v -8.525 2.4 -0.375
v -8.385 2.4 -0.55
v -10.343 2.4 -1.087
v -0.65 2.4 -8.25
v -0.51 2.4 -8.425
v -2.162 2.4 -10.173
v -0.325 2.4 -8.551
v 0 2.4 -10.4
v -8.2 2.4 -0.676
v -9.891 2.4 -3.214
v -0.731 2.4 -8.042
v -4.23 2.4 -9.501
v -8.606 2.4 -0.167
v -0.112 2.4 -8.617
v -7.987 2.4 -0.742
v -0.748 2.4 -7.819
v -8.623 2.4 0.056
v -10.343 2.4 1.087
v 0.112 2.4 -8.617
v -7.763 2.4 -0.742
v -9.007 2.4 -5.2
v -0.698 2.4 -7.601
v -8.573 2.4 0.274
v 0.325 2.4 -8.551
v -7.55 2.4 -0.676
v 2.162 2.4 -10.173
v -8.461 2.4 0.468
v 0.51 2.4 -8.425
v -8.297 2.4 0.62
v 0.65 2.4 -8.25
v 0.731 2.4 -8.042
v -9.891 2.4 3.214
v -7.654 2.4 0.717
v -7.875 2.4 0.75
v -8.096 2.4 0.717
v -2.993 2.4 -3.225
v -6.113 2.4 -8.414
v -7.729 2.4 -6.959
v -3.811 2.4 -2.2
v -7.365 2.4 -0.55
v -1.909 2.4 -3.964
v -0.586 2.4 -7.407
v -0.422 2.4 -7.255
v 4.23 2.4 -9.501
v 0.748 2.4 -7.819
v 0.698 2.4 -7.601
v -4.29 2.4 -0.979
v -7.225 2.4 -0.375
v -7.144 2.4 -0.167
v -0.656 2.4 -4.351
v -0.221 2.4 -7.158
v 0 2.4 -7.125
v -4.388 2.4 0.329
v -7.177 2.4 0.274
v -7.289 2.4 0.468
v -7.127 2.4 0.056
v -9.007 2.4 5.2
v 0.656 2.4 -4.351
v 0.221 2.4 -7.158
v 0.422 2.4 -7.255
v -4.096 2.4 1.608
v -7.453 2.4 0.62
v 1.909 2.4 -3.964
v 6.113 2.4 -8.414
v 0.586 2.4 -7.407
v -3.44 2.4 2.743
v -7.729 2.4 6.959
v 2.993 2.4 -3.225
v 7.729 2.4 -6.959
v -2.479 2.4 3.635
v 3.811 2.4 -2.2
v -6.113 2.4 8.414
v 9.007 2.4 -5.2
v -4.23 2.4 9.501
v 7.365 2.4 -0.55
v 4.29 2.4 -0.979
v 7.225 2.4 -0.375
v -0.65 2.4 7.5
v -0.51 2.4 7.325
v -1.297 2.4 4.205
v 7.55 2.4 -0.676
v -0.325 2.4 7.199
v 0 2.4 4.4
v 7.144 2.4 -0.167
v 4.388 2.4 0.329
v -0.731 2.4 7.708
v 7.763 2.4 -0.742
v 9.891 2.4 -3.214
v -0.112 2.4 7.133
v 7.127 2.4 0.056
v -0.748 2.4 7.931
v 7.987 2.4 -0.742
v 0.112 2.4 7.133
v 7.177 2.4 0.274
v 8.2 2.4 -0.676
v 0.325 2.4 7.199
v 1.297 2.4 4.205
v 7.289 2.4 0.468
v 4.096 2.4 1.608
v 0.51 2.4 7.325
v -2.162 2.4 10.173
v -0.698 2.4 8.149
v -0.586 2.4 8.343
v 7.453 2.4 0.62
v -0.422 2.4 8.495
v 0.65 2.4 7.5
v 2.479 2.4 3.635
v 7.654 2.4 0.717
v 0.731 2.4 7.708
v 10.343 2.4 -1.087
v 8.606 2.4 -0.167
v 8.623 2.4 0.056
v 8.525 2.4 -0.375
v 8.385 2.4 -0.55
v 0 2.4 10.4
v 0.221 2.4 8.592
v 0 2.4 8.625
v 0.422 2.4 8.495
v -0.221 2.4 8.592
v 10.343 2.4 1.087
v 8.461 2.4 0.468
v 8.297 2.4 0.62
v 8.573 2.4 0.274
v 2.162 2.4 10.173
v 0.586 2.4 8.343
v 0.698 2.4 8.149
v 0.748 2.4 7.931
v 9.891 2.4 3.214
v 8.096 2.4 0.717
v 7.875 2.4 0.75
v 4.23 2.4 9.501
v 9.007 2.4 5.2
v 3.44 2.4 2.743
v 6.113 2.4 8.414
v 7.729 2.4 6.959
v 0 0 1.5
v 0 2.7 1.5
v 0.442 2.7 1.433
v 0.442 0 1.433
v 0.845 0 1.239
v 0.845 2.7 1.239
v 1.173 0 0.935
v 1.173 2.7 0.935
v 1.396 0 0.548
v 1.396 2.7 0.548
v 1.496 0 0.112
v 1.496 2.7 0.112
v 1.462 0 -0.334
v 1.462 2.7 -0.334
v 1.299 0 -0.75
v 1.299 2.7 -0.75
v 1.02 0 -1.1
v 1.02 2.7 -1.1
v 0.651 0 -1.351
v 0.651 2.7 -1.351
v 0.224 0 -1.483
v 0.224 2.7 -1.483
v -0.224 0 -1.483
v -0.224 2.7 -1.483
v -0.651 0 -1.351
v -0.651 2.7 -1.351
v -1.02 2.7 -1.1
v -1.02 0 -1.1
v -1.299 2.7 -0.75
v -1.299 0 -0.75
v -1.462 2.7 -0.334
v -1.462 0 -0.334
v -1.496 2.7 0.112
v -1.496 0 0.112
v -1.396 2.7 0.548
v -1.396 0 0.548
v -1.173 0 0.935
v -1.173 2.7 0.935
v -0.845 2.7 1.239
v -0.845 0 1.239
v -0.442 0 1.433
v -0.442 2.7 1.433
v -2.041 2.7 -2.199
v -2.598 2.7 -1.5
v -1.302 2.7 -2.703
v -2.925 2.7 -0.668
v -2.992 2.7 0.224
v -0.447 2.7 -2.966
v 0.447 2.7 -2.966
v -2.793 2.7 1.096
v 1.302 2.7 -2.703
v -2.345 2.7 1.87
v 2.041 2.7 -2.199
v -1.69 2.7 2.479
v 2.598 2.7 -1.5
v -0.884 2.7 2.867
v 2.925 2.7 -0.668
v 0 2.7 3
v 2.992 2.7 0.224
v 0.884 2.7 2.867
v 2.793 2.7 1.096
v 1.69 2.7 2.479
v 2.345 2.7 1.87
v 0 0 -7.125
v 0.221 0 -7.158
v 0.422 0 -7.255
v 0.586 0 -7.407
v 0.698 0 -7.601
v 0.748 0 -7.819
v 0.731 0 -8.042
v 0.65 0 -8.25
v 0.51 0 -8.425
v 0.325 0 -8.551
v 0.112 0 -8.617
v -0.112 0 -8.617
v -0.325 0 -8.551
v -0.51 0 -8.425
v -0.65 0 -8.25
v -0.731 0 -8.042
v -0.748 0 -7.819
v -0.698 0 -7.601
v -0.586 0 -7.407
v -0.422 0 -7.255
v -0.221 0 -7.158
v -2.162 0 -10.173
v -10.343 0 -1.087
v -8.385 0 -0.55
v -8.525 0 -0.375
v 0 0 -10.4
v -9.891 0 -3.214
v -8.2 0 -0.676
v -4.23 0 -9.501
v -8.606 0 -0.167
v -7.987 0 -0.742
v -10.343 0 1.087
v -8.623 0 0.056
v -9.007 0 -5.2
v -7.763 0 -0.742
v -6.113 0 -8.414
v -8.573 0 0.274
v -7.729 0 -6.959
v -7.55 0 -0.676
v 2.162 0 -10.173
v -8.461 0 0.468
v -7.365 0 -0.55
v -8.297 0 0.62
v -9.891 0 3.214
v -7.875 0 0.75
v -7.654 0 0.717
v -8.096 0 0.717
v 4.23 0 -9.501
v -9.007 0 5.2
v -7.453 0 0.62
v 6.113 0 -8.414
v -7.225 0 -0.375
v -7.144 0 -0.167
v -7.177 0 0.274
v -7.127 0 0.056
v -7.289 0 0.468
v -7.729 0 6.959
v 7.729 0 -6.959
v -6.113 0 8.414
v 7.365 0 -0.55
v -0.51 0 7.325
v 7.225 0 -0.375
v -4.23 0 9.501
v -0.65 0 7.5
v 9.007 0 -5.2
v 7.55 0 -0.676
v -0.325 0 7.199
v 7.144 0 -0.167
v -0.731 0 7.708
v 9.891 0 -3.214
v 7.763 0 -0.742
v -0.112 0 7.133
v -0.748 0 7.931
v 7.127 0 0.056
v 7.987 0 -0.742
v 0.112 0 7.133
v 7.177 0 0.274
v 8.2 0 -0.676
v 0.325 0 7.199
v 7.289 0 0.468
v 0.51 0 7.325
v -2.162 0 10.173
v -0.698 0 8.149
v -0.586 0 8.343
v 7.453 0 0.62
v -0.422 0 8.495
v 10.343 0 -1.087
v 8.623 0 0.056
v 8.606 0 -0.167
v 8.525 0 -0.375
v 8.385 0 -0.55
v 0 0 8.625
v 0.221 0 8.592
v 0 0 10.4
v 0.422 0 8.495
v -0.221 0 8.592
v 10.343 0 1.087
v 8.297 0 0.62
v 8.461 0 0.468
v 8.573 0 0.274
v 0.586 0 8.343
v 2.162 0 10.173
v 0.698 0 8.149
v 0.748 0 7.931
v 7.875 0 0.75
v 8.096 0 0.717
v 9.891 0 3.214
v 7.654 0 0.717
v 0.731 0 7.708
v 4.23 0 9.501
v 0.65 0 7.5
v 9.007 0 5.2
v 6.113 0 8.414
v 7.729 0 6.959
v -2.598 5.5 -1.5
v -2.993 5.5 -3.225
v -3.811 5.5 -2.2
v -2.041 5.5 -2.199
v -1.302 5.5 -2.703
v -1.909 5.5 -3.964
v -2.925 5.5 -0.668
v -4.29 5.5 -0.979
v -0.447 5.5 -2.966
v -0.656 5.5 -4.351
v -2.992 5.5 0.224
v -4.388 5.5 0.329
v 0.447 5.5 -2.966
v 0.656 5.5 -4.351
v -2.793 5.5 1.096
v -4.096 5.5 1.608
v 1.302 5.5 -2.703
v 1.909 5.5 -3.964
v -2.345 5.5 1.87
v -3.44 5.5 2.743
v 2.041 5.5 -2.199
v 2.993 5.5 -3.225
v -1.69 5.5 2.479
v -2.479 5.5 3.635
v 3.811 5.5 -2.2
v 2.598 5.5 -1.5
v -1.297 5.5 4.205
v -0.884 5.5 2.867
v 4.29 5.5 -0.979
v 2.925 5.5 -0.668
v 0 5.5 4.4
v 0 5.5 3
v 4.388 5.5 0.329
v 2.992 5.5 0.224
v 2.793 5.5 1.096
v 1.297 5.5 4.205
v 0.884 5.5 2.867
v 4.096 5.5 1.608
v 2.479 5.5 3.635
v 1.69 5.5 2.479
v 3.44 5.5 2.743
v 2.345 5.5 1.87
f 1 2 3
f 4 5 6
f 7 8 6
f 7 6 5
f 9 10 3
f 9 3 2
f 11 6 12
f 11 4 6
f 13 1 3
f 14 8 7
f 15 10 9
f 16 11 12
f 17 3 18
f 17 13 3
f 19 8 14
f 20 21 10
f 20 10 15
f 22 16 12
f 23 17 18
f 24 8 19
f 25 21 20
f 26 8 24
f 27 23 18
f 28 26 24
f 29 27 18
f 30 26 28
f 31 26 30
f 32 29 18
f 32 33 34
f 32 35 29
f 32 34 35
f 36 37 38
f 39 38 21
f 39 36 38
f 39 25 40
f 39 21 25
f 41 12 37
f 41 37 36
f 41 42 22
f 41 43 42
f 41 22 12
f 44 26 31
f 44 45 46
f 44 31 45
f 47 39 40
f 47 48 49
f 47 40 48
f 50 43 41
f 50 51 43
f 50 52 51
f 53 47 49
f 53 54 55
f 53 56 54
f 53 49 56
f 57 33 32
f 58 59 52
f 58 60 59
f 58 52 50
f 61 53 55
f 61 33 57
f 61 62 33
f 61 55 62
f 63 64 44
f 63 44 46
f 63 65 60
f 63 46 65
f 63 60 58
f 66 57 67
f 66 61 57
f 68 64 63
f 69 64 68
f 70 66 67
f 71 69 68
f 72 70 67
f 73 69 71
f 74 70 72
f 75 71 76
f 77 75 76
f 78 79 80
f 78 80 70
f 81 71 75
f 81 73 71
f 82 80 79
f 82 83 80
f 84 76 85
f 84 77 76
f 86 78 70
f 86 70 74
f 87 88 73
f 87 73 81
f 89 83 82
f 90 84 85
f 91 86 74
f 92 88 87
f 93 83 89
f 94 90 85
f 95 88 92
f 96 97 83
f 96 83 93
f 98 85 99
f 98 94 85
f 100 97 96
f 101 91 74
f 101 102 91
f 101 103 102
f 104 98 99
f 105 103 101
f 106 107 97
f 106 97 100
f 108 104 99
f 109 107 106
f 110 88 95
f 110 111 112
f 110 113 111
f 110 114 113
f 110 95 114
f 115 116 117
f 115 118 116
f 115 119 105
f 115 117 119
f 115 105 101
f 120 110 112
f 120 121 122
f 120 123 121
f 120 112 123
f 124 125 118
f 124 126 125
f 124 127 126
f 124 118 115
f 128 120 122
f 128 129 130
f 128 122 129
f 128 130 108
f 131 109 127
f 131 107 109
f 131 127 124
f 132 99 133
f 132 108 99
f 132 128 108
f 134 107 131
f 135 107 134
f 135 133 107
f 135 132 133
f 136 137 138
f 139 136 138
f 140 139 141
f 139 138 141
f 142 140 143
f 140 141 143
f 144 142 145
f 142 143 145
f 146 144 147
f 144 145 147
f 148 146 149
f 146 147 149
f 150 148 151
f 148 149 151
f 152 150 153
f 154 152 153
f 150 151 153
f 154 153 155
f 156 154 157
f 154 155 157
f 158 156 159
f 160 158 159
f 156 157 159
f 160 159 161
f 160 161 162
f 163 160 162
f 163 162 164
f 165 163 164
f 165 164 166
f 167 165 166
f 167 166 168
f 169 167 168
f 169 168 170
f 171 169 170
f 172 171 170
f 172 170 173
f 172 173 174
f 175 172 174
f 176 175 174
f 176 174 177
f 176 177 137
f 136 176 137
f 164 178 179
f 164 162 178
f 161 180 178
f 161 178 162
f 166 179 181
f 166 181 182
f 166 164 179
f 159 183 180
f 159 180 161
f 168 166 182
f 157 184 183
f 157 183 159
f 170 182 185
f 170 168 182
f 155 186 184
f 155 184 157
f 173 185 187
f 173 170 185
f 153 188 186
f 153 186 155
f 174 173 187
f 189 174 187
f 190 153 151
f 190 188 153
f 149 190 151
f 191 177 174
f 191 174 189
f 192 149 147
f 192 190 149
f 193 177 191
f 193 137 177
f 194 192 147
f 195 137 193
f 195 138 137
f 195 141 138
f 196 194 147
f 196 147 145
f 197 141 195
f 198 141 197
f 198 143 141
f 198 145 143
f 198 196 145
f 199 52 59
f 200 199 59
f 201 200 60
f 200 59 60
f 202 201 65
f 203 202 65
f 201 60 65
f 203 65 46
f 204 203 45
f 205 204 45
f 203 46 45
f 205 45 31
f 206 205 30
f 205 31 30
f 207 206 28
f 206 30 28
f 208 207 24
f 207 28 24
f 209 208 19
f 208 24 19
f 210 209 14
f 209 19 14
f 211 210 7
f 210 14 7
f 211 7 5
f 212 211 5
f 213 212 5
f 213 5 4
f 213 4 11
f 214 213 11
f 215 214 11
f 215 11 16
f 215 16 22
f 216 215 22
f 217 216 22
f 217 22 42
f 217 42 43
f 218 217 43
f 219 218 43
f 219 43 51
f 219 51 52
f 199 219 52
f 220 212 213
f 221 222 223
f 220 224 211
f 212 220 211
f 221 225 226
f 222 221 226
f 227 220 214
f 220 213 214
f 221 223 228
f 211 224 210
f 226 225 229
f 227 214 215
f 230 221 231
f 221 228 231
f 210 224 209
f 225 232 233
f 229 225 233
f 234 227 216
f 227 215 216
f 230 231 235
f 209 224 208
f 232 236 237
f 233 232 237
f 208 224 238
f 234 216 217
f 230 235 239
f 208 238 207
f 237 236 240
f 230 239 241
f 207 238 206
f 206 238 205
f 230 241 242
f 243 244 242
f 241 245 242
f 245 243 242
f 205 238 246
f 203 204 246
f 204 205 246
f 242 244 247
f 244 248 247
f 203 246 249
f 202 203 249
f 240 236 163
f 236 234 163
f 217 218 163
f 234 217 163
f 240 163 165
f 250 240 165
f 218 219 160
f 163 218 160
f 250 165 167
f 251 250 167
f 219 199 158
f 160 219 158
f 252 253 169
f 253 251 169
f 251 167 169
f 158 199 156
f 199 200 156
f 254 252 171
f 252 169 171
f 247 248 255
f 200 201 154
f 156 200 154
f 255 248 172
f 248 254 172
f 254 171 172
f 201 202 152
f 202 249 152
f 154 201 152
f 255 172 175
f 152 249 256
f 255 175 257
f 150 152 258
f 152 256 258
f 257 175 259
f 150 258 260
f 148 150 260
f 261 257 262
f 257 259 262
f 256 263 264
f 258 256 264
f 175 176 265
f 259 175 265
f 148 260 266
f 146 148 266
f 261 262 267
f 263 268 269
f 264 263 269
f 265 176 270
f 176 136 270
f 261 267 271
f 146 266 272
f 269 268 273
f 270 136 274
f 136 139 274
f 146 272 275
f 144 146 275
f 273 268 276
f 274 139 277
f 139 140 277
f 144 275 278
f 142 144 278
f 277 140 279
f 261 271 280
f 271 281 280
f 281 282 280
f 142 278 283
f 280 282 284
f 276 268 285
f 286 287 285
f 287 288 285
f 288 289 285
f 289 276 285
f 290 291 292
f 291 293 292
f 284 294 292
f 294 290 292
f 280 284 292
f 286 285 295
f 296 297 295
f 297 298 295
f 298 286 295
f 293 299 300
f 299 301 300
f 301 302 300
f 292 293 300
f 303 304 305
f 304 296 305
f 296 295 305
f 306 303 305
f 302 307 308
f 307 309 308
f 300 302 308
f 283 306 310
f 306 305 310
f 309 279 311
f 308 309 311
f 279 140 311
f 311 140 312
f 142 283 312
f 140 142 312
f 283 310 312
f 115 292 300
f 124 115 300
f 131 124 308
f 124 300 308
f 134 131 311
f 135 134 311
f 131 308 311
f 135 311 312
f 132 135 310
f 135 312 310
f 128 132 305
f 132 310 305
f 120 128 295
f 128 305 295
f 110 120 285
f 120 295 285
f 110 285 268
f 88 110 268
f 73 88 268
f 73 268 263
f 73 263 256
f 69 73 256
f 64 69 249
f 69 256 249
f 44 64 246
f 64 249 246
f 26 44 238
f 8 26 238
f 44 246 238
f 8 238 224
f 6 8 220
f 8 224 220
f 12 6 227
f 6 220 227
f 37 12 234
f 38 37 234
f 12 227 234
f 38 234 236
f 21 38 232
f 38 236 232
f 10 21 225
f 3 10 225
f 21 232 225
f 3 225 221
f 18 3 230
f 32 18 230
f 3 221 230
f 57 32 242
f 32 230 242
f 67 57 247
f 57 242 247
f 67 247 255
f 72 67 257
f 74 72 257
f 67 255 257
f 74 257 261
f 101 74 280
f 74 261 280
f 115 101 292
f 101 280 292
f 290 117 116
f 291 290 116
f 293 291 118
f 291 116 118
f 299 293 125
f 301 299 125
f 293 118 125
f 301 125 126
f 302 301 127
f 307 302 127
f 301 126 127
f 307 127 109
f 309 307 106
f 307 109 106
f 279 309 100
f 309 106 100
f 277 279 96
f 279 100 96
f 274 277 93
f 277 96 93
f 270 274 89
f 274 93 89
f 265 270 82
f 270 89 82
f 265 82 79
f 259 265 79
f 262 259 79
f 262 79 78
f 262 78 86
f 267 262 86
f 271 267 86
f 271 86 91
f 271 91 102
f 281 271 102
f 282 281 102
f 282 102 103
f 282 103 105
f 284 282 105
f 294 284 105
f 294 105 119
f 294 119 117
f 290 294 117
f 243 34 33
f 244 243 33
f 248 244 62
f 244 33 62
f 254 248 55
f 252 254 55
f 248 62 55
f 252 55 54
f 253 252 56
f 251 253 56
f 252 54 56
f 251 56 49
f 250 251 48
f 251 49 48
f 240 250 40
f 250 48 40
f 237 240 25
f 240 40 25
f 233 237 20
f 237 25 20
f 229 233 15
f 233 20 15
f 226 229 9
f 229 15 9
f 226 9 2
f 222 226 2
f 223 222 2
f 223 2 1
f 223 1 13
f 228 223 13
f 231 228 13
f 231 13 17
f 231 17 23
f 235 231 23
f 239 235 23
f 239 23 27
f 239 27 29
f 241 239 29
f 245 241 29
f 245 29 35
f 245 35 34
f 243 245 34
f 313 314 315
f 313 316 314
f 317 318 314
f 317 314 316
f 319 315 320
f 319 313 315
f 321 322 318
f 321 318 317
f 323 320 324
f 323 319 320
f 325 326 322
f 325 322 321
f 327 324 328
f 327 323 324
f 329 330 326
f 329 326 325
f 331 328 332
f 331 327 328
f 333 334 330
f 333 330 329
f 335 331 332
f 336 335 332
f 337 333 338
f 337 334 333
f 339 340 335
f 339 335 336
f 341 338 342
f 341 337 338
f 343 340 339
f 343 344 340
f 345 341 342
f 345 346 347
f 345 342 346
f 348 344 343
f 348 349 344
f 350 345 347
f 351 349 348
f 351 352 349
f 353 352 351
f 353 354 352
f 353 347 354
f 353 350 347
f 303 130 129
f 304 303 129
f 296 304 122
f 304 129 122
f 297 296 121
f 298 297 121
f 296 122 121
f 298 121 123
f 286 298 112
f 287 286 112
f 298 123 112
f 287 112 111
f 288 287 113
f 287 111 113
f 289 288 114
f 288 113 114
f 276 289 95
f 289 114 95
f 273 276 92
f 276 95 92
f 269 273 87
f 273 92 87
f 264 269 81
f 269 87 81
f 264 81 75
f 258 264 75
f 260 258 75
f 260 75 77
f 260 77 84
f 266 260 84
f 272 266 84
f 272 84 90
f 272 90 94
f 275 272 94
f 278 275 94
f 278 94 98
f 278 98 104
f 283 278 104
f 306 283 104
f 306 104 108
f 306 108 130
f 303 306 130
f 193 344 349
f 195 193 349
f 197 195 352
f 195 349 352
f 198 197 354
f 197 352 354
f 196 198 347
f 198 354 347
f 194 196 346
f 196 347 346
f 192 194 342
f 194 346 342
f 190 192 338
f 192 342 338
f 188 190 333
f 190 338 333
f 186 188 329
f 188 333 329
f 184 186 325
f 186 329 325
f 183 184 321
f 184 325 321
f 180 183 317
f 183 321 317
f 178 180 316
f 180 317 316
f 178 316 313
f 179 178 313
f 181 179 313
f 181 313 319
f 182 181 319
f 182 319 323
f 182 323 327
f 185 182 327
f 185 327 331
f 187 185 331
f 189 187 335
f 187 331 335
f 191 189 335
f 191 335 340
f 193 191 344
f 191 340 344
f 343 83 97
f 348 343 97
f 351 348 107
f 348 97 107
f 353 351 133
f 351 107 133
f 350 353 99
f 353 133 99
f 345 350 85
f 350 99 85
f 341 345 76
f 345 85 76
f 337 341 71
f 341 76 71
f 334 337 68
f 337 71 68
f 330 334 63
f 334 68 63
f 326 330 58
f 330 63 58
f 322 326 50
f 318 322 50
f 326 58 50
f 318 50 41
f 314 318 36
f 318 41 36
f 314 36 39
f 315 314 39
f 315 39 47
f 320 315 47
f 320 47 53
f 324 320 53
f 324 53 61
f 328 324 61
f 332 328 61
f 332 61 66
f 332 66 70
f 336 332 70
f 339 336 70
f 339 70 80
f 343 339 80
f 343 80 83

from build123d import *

# Parameters (mm, degrees)
CROQUIS1_R              = 10.4
SALIENTE_EXTRUIR1_DEPTH = 2.4
SALIENTE_EXTRUIR2_START = -2.4
CROQUIS2_R              = 4.4
SALIENTE_EXTRUIR2_DEPTH = 5.5
CROQUIS3_R              = 3
CORTAR_EXTRUIR1_DEPTH   = 2.8
CROQUIS4_R              = 0.75
CORTAR_EXTRUIR2_DEPTH   = 16.030968033
CROQUIS5_R              = 1.5
CORTAR_EXTRUIR3_DEPTH   = 15.971973818


with BuildPart() as part:
    # Croquis1 → Saliente-Extruir1 (new body)
    with BuildSketch(Plane(origin=(0, 0, 0), x_dir=(1, 0, 0), z_dir=(0, 1, 0))):
        with Locations(Location((0, 0, 0), (0, 0, 270))):
            Circle(CROQUIS1_R)
    extrude(amount=SALIENTE_EXTRUIR1_DEPTH)

    # Croquis2 → Saliente-Extruir2 (add)
    with BuildSketch(Plane(origin=(0, 2.4, 0), x_dir=(1, 0, 0), z_dir=(0, 1, 0)).offset(SALIENTE_EXTRUIR2_START)):
        with Locations(Location((0, 0, 0), (0, 0, 270))):
            Circle(CROQUIS2_R)
    extrude(amount=SALIENTE_EXTRUIR2_DEPTH)

    # Croquis3 → Cortar-Extruir1 (cut)
    with BuildSketch(Plane(origin=(0, 5.5, 0), x_dir=(1, 0, 0), z_dir=(0, 1, 0))):
        with Locations(Location((0, 0, 0), (0, 0, 270))):
            Circle(CROQUIS3_R)
    extrude(amount=-CORTAR_EXTRUIR1_DEPTH, mode=Mode.SUBTRACT)

    # Croquis4 → Cortar-Extruir2 (cut, through all)
    with BuildSketch(Plane(origin=(0, 2.4, 0), x_dir=(1, 0, 0), z_dir=(0, 1, 0))):
        with Locations(Location((0, 7.875, 0), (0, 0, 270))):
            Circle(CROQUIS4_R)
        with Locations(Location((7.875, 0, 0), (0, 0, 270))):
            Circle(CROQUIS4_R)
        with Locations(Location((0, -7.875, 0), (0, 0, 270))):
            Circle(CROQUIS4_R)
        with Locations(Location((-7.875, 0, 0), (0, 0, 270))):
            Circle(CROQUIS4_R)
    extrude(amount=-CORTAR_EXTRUIR2_DEPTH, mode=Mode.SUBTRACT)

    # Croquis5 → Cortar-Extruir3 (cut, through all)
    with BuildSketch(Plane(origin=(0, 2.7, 0), x_dir=(1, 0, 0), z_dir=(0, 1, 0))):
        with Locations(Location((0, 0, 0), (0, 0, 270))):
            Circle(CROQUIS5_R)
    extrude(amount=-CORTAR_EXTRUIR3_DEPTH, mode=Mode.SUBTRACT)


solid = part.part
